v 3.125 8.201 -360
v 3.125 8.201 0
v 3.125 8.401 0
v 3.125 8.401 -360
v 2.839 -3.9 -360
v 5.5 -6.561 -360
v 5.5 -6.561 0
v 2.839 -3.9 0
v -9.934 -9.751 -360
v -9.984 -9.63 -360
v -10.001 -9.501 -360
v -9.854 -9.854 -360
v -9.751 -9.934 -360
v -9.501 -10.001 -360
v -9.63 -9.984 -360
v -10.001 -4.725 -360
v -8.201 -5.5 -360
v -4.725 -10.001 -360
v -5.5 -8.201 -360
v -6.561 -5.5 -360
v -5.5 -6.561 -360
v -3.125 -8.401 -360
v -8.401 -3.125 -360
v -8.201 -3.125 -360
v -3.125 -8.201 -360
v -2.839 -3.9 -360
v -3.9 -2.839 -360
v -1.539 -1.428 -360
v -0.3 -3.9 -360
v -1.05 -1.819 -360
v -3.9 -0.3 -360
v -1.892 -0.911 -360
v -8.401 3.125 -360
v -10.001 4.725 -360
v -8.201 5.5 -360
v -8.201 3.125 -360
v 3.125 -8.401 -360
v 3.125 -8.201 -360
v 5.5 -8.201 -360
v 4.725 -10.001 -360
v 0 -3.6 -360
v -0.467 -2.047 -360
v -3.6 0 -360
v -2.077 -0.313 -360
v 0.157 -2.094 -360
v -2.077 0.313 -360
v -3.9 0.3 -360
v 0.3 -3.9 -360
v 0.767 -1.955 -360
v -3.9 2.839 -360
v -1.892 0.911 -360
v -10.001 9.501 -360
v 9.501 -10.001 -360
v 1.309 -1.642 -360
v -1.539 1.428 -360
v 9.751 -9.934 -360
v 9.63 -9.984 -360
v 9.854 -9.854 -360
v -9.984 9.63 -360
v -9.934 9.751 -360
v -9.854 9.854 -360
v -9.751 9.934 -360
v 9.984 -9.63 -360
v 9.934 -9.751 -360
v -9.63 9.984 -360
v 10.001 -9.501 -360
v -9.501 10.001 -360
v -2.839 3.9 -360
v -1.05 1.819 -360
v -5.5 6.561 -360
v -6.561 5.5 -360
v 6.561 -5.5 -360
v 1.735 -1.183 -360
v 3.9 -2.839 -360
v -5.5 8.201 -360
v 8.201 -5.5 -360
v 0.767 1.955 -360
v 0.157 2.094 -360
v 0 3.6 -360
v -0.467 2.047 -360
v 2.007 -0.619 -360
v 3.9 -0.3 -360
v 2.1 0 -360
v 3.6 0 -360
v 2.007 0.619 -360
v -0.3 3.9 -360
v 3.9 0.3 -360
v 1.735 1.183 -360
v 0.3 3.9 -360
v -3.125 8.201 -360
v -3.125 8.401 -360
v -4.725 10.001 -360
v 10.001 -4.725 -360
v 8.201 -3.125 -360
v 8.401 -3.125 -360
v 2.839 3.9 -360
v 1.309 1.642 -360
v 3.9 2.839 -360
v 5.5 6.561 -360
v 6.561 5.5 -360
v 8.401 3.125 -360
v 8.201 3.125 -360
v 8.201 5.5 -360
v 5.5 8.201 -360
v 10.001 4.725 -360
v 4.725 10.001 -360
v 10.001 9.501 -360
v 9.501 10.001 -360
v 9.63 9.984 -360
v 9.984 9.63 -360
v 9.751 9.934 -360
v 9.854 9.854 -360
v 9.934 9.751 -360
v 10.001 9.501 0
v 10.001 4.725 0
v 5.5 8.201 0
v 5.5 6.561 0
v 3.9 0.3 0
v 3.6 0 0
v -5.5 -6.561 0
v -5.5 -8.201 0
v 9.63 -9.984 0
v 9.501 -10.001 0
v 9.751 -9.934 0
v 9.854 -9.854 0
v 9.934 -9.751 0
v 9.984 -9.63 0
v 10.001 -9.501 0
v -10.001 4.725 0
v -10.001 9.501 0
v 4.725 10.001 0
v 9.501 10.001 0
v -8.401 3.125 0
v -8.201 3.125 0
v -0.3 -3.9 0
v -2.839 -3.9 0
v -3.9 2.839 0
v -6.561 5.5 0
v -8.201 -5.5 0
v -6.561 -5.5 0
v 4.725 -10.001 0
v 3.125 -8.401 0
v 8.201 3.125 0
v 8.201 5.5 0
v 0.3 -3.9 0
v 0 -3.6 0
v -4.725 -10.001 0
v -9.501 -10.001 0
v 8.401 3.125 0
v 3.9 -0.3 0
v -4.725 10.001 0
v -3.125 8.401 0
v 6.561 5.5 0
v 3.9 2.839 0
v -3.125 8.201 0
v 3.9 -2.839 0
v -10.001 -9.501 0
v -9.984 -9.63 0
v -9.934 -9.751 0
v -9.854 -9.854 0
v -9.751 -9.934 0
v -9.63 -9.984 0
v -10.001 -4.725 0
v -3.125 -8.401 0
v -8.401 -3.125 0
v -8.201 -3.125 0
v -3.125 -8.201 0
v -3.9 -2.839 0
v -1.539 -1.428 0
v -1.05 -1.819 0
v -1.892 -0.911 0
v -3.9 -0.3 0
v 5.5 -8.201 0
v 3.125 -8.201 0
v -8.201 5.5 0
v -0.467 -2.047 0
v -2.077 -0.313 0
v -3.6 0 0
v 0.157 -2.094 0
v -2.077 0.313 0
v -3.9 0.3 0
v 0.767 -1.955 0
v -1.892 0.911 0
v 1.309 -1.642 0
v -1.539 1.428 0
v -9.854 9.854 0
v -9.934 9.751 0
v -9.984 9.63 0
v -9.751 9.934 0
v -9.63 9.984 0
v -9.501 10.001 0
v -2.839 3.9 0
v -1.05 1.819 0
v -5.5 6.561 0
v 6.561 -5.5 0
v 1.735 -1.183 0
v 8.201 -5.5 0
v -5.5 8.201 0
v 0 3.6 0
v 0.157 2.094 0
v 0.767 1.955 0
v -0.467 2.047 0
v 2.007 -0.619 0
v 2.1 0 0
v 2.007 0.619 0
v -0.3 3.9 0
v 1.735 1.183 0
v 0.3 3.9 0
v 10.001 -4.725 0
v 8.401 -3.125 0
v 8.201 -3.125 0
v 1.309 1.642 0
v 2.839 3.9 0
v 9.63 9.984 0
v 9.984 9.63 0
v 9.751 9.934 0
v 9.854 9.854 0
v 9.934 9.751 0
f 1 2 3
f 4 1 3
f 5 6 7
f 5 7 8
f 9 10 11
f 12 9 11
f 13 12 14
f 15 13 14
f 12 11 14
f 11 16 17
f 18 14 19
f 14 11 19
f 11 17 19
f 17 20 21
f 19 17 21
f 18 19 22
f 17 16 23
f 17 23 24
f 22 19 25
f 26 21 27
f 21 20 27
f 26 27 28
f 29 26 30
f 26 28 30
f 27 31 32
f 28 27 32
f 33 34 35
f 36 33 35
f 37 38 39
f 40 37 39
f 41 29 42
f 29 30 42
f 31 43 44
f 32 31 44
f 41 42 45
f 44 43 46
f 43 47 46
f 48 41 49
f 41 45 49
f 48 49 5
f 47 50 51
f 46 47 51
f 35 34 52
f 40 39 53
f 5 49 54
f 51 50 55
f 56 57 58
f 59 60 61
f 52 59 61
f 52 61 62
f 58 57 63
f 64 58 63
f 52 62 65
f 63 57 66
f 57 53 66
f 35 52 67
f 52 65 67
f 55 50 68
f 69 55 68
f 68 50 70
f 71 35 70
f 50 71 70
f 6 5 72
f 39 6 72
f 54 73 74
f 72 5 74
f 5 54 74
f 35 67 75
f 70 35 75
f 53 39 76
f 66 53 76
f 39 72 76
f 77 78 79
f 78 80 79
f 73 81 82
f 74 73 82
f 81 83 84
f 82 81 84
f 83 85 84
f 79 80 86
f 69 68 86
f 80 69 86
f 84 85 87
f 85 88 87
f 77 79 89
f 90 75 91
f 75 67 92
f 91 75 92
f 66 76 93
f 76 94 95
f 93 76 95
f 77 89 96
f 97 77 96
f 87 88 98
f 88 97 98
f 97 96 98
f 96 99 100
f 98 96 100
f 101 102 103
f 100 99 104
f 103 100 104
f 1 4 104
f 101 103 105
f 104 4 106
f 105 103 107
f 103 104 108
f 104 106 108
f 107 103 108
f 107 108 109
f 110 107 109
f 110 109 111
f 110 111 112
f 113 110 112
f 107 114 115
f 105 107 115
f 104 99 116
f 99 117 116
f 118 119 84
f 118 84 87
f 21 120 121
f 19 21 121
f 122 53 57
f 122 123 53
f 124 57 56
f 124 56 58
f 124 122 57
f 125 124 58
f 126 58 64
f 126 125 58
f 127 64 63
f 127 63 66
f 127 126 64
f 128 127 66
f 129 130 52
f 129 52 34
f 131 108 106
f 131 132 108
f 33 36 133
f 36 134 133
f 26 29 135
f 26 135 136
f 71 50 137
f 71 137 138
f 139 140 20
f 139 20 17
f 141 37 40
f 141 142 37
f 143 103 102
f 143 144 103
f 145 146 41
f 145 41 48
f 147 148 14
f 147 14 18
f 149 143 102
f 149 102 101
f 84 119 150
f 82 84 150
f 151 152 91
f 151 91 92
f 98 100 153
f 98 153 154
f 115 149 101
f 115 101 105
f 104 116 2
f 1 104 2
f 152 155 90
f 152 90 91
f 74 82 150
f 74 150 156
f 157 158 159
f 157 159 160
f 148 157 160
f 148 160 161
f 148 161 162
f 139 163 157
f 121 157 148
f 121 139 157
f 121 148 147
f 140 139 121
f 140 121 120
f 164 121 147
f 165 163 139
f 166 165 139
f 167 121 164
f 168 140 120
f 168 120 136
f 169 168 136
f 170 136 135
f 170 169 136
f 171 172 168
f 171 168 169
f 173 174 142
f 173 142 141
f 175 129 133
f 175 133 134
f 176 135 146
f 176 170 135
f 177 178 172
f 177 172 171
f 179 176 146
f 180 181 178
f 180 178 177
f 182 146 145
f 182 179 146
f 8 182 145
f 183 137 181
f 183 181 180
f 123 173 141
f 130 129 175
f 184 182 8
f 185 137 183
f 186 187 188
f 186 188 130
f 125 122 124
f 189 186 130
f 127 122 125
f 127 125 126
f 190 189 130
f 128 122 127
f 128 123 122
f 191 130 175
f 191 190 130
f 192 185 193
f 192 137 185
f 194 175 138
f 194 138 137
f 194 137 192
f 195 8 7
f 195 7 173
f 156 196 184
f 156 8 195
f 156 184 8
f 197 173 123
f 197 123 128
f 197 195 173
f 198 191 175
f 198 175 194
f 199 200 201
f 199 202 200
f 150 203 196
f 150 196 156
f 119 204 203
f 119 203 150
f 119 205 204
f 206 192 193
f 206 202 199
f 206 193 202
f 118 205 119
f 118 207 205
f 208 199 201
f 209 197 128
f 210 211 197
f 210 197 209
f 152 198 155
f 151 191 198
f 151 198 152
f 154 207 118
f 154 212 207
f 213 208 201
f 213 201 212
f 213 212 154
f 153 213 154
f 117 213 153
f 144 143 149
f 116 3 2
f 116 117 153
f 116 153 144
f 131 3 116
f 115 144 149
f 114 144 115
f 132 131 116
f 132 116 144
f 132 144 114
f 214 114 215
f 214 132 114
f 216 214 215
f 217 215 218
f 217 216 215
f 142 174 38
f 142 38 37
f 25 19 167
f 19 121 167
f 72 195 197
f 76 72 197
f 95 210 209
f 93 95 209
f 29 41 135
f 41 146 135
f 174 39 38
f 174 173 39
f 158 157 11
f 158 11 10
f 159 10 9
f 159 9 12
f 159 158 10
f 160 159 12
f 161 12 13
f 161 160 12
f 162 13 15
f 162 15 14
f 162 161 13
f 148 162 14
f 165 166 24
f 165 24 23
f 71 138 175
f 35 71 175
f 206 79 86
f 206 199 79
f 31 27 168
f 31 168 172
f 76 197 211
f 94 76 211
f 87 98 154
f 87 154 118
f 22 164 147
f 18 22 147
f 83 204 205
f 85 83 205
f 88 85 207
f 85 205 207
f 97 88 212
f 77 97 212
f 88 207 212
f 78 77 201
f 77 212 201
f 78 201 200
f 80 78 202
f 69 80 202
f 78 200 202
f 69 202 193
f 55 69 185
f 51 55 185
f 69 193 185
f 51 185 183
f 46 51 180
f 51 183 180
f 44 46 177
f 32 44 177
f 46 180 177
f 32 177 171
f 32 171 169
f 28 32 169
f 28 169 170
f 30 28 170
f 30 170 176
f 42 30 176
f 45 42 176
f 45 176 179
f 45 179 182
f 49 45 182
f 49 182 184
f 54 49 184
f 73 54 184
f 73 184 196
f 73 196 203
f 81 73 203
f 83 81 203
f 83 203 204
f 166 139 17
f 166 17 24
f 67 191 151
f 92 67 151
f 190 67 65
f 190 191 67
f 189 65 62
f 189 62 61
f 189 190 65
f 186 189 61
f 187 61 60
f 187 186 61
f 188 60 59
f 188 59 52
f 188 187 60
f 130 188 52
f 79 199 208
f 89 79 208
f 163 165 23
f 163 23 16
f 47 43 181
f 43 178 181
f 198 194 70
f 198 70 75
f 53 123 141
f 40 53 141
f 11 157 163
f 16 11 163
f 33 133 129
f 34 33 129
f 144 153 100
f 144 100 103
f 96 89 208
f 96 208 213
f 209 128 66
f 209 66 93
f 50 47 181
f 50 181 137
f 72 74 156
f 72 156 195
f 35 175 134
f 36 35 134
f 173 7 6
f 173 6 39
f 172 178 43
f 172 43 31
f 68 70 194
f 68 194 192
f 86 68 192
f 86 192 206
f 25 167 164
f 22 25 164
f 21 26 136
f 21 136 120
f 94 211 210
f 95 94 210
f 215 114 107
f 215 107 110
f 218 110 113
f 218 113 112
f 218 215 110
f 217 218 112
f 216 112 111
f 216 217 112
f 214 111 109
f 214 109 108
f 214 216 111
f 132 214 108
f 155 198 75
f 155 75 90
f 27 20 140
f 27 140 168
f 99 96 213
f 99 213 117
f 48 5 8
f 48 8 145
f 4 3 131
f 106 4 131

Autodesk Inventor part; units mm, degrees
ref_plane "YZ Plane" through (0, 0, 0) normal (1, 0, 0) x (0, 1, 0)
ref_plane "XZ Plane" through (0, 0, 0) normal (0, 1, 0) x (-1, 0, 0)
ref_plane "XY Plane" through (0, 0, 0) normal (0, 0, 1) x (1, 0, 0)
sketch "Sketch2" plane through (0, 0, 0) normal (0, 0, 1) x (1, 0, 0)
  arc A0 (-27.4375, 16.3608) -> (-26.9375, 16.8608) centre (-27.4375, 16.8608) ccw
  line L0 (-45.4375, 36.3608) -> (-46.4375, 36.3608)
  line L1 (-46.9375, 34.8608) -> (-46.9375, 35.8608)
  line L2 (-28.4375, 36.3608) -> (-27.4375, 36.3608)
  line L3 (-26.9375, 17.8608) -> (-26.9375, 16.8608)
  line L4 (-28.4375, 16.3608) -> (-27.4375, 16.3608)
  line L5 (-26.9375, 31.1923) -> (-26.9375, 35.8608)
  line L6 (-46.4375, 16.3608) -> (-41.7689, 16.3608)
  line L7 (-46.9375, 17.8608) -> (-46.9375, 16.8608)
  arc A1 (-46.9375, 16.8608) -> (-46.4375, 16.3608) centre (-46.4375, 16.8608) ccw
  arc A2 (-46.9375, 16.8608) -> (-46.4375, 16.3608) centre (-46.4375, 16.8608) ccw
  arc A3 (-46.4375, 36.3608) -> (-46.9375, 35.8608) centre (-46.4375, 35.8608) ccw
  arc A4 (-26.9375, 35.8608) -> (-27.4375, 36.3608) centre (-27.4375, 35.8608) ccw
  line L8 (-41.5004, 36.2982) -> (-41.5366, 36.3146)
  line L9 (-46.812, 30.8227) -> (-46.8352, 30.855)
  line L10 (-46.9375, 17.8608) -> (-46.9375, 21.4608)
  line L11 (-46.9362, 21.5691) -> (-46.9375, 21.4608)
  line L12 (-46.9258, 21.6478) -> (-46.9323, 21.6086)
  line L13 (-46.9323, 21.6086) -> (-46.9362, 21.5691)
  line L14 (-46.9168, 21.6865) -> (-46.9258, 21.6478)
  line L15 (-46.9053, 21.7245) -> (-46.9168, 21.6865)
  line L16 (-46.8913, 21.7617) -> (-46.9053, 21.7245)
  line L17 (-46.8749, 21.7979) -> (-46.8913, 21.7617)
  line L18 (-46.8561, 21.8329) -> (-46.8749, 21.7979)
  line L19 (-46.812, 21.8989) -> (-46.8352, 21.8667)
  line L20 (-46.8352, 21.8667) -> (-46.8561, 21.8329)
  line L21 (-41.4654, 36.2795) -> (-41.5004, 36.2982)
  line L22 (-46.7868, 21.9297) -> (-46.812, 21.8989)
  line L23 (-46.7597, 21.9586) -> (-46.7868, 21.9297)
  line L24 (-46.7597, 21.9586) -> (-45.2441, 23.4742)
  line L25 (-45.2441, 23.4742) -> (-45.1375, 23.4742)
  line L26 (-45.1375, 23.4742) -> (-45.1375, 20.8608)
  line L27 (-45.1375, 20.8608) -> (-43.4981, 20.8608)
  line L28 (-43.4981, 20.8608) -> (-40.8375, 23.5215)
  line L29 (-46.7868, 30.792) -> (-46.812, 30.8227)
  line L30 (-40.8375, 26.161) -> (-40.8375, 23.5215)
  line L31 (-40.6376, 26.3608) -> (-40.8375, 26.161)
  line L32 (-40.6376, 26.3608) -> (-40.8375, 26.5607)
  line L33 (-40.8375, 29.2002) -> (-40.8375, 26.5607)
  line L34 (-43.4981, 31.8608) -> (-40.8375, 29.2002)
  line L35 (-45.1375, 31.8608) -> (-43.4981, 31.8608)
  line L36 (-45.1375, 29.2475) -> (-45.1375, 31.8608)
  line L37 (-46.7597, 30.763) -> (-46.7868, 30.792)
  line L38 (-45.2441, 29.2475) -> (-45.1375, 29.2475)
  line L39 (-45.2441, 29.2475) -> (-46.7597, 30.763)
  line L40 (-28.7375, 20.8608) -> (-30.3768, 20.8608)
  line L41 (-41.5738, 36.3286) -> (-41.6118, 36.3402)
  line L42 (-41.3687, 36.2102) -> (-41.3994, 36.2354)
  line L43 (-41.3397, 36.183) -> (-41.3687, 36.2102)
  line L44 (-41.6118, 36.3402) -> (-41.6505, 36.3492)
  line L45 (-41.7292, 16.3621) -> (-41.7689, 16.3608)
  line L46 (-41.6897, 16.366) -> (-41.7292, 16.3621)
  line L47 (-41.6505, 16.3725) -> (-41.6897, 16.366)
  line L48 (-41.6118, 16.3815) -> (-41.6505, 16.3725)
  line L49 (-41.5738, 16.3931) -> (-41.6118, 16.3815)
  line L50 (-41.5366, 16.4071) -> (-41.5738, 16.3931)
  line L51 (-42.4375, 32.9215) -> (-39.7768, 30.2608)
  line L52 (-41.5004, 16.4235) -> (-41.5366, 16.4071)
  line L53 (-41.4654, 16.4422) -> (-41.5004, 16.4235)
  line L54 (-41.4317, 16.4632) -> (-41.4654, 16.4422)
  line L55 (-41.3994, 16.4863) -> (-41.4317, 16.4632)
  line L56 (-41.3687, 16.5115) -> (-41.3994, 16.4863)
  line L57 (-41.3397, 16.5386) -> (-41.3687, 16.5115)
  line L58 (-41.3397, 16.5386) -> (-39.8241, 18.0542)
  line L59 (-39.8241, 18.0542) -> (-39.8241, 18.1608)
  line L60 (-39.8241, 18.1608) -> (-42.4375, 18.1608)
  line L61 (-42.4375, 18.1608) -> (-42.4375, 19.8002)
  line L62 (-42.4375, 19.8002) -> (-39.7768, 22.4608)
  line L63 (-39.7768, 22.4608) -> (-37.1444, 22.4608)
  line L64 (-37.1444, 22.4608) -> (-36.9375, 22.6656)
  line L65 (-36.9375, 22.6656) -> (-36.7327, 22.4608)
  line L66 (-36.7327, 22.4608) -> (-34.0981, 22.4608)
  line L67 (-34.0981, 22.4608) -> (-31.4375, 19.8002)
  line L68 (-31.4375, 18.1608) -> (-31.4375, 19.8002)
  line L69 (-41.3397, 36.183) -> (-39.8241, 34.6675)
  line L70 (-34.0508, 18.1608) -> (-31.4375, 18.1608)
  line L71 (-41.6505, 36.3492) -> (-41.6897, 36.3557)
  line L72 (-34.0508, 18.0542) -> (-34.0508, 18.1608)
  line L73 (-34.0508, 18.0542) -> (-32.5353, 16.5387)
  line L74 (-32.5353, 16.5387) -> (-32.5063, 16.5115)
  line L75 (-32.5063, 16.5115) -> (-32.4756, 16.4863)
  line L76 (-32.4756, 16.4863) -> (-32.4433, 16.4632)
  line L77 (-32.4433, 16.4632) -> (-32.4096, 16.4422)
  line L78 (-32.4096, 16.4422) -> (-32.3745, 16.4235)
  line L79 (-32.3745, 16.4235) -> (-32.3383, 16.4071)
  line L80 (-32.3383, 16.4071) -> (-32.3012, 16.3931)
  line L81 (-32.3012, 16.3931) -> (-32.2631, 16.3815)
  line L82 (-32.2631, 16.3815) -> (-32.2245, 16.3725)
  line L83 (-32.2245, 16.3725) -> (-32.1853, 16.366)
  line L84 (-32.1853, 16.366) -> (-32.1457, 16.3621)
  line L85 (-32.1457, 16.3621) -> (-32.106, 16.3608)
  line L86 (-28.4375, 16.3608) -> (-32.106, 16.3608)
  line L87 (-39.8241, 34.6675) -> (-39.8241, 34.5608)
  line L88 (-41.6897, 36.3557) -> (-41.7292, 36.3595)
  line L89 (-26.9375, 17.8608) -> (-26.9375, 21.5294)
  line L90 (-26.9388, 21.5691) -> (-26.9375, 21.5294)
  line L91 (-26.9427, 21.6086) -> (-26.9388, 21.5691)
  line L92 (-26.9491, 21.6478) -> (-26.9427, 21.6086)
  line L93 (-26.9582, 21.6865) -> (-26.9491, 21.6478)
  line L94 (-26.9697, 21.7245) -> (-26.9582, 21.6865)
  line L95 (-26.9837, 21.7617) -> (-26.9697, 21.7245)
  line L96 (-27.0001, 21.7979) -> (-26.9837, 21.7617)
  line L97 (-41.7292, 36.3595) -> (-41.7689, 36.3608)
  line L98 (-27.0188, 21.8329) -> (-27.0001, 21.7979)
  line L99 (-27.0398, 21.8667) -> (-27.0188, 21.8329)
  line L100 (-27.0629, 21.8989) -> (-27.0398, 21.8667)
  line L101 (-27.0881, 21.9297) -> (-27.0629, 21.8989)
  line L102 (-27.1153, 21.9587) -> (-27.0881, 21.9297)
  line L103 (-28.6308, 23.4742) -> (-27.1153, 21.9587)
  line L104 (-28.6308, 23.4742) -> (-28.7375, 23.4742)
  line L105 (-28.7375, 23.4742) -> (-28.7375, 20.8608)
  line L106 (-32.3012, 36.3286) -> (-32.2631, 36.3402)
  line L107 (-30.3768, 20.8608) -> (-33.0375, 23.5215)
  line L108 (-33.0375, 23.5215) -> (-33.0375, 26.161)
  line L109 (-33.2373, 26.3608) -> (-33.0375, 26.161)
  line L110 (-33.2373, 26.3608) -> (-33.0375, 26.5607)
  line L111 (-33.0375, 29.2002) -> (-33.0375, 26.5607)
  line L112 (-30.3768, 31.8608) -> (-33.0375, 29.2002)
  line L113 (-45.4375, 36.3608) -> (-41.7689, 36.3608)
  line L114 (-28.6308, 29.2475) -> (-28.7375, 29.2475)
  line L115 (-28.7375, 31.8608) -> (-30.3768, 31.8608)
  line L116 (-28.7375, 29.2475) -> (-28.7375, 31.8608)
  line L117 (-27.1153, 30.763) -> (-28.6308, 29.2475)
  line L118 (-27.1153, 30.763) -> (-27.0881, 30.792)
  line L119 (-27.0881, 30.792) -> (-27.0629, 30.8227)
  line L120 (-27.0629, 30.8227) -> (-27.0398, 30.855)
  line L121 (-27.0398, 30.855) -> (-27.0188, 30.8888)
  line L122 (-27.0188, 30.8888) -> (-27.0001, 30.9238)
  line L123 (-27.0001, 30.9238) -> (-26.9837, 30.96)
  line L124 (-26.9837, 30.96) -> (-26.9697, 30.9972)
  line L125 (-26.9697, 30.9972) -> (-26.9582, 31.0352)
  line L126 (-26.9582, 31.0352) -> (-26.9491, 31.0739)
  line L127 (-26.9491, 31.0739) -> (-26.9427, 31.1131)
  line L128 (-26.9427, 31.1131) -> (-26.9388, 31.1526)
  line L129 (-26.9388, 31.1526) -> (-26.9375, 31.1923)
  line L130 (-39.8241, 34.5608) -> (-42.4375, 34.5608)
  line L131 (-28.4375, 36.3608) -> (-32.106, 36.3608)
  line L132 (-32.1457, 36.3595) -> (-32.106, 36.3608)
  line L133 (-32.1853, 36.3557) -> (-32.1457, 36.3595)
  line L134 (-32.2631, 36.3402) -> (-32.2245, 36.3492)
  line L135 (-32.3383, 36.3146) -> (-32.3012, 36.3286)
  line L136 (-32.3745, 36.2982) -> (-32.3383, 36.3146)
  line L137 (-32.4096, 36.2795) -> (-32.3745, 36.2982)
  line L138 (-32.4433, 36.2585) -> (-32.4096, 36.2795)
  line L139 (-32.4756, 36.2354) -> (-32.4433, 36.2585)
  line L140 (-32.5063, 36.2102) -> (-32.4756, 36.2354)
  line L141 (-46.9323, 31.1131) -> (-46.9362, 31.1526)
  line L142 (-34.0508, 34.6675) -> (-32.5353, 36.183)
  line L143 (-34.0508, 34.6675) -> (-34.0508, 34.5608)
  line L144 (-34.0508, 34.5608) -> (-31.4375, 34.5608)
  line L145 (-31.4375, 34.5608) -> (-31.4375, 32.9215)
  line L146 (-34.0981, 30.2608) -> (-31.4375, 32.9215)
  line L147 (-34.0981, 30.2608) -> (-36.7327, 30.2608)
  line L148 (-42.4375, 34.5608) -> (-42.4375, 32.9215)
  line L149 (-36.7327, 30.2608) -> (-36.9375, 30.0561)
  line L150 (-37.1422, 30.2608) -> (-36.9375, 30.0561)
  line L151 (-39.7768, 30.2608) -> (-37.1422, 30.2608)
  line L152 (-32.5353, 36.183) -> (-32.5063, 36.2102)
  line L153 (-41.3994, 36.2354) -> (-41.4317, 36.2585)
  line L154 (-46.9258, 31.0739) -> (-46.9323, 31.1131)
  line L155 (-41.4317, 36.2585) -> (-41.4654, 36.2795)
  line L156 (-46.9362, 31.1526) -> (-46.9375, 31.2608)
  line L157 (-46.9168, 31.0352) -> (-46.9258, 31.0739)
  line L158 (-46.9375, 34.8608) -> (-46.9375, 31.2608)
  line L159 (-46.9053, 30.9972) -> (-46.9168, 31.0352)
  line L160 (-46.8913, 30.96) -> (-46.9053, 30.9972)
  line L161 (-46.8749, 30.9238) -> (-46.8913, 30.96)
  line L162 (-46.8561, 30.8888) -> (-46.8749, 30.9238)
  line L163 (-32.2245, 36.3492) -> (-32.1853, 36.3557)
  line L164 (-41.5366, 36.3146) -> (-41.5738, 36.3286)
  line L165 (-46.8352, 30.855) -> (-46.8561, 30.8888)
  circle A5 centre (-36.9375, 26.3608) radius 2.1
  line L166 (3.9, -0.3) -> (3.9, -2.8393)
  line L167 (2.8393, -3.9) -> (0.3, -3.9)
  line L168 (5.5, -6.5607) -> (2.8393, -3.9)
  line L169 (3.9, -2.8393) -> (6.5607, -5.5)
  line L170 (6.5607, -5.5) -> (8.2007, -5.5)
  line L171 (8.2007, -5.5) -> (8.2007, -3.125)
  line L172 (8.2007, -3.125) -> (8.4007, -3.125)
  line L173 (8.4007, -3.125) -> (10.0007, -4.725)
  line L174 (10.0007, -9.5007) -> (10.0007, -4.725)
  line L175 (5.5, -6.5607) -> (5.5, -8.2007)
  line L176 (5.5, -8.2007) -> (3.125, -8.2007)
  line L177 (3.125, -8.2007) -> (3.125, -8.4007)
  line L178 (3.125, -8.4007) -> (4.725, -10.0007)
  line L179 (9.5007, -10.0007) -> (4.725, -10.0007)
  arc A6 (9.5007, -10.0007) -> (10.0007, -9.5007) centre (9.5007, -9.5007) ccw
  line L180 (0, -3.6) -> (0.3, -3.9)
  line L181 (3.6, 0) -> (3.9, -0.3)
  line L182 (3.125, 8.2007) -> (3.125, 8.4007)
  line L183 (0.3, 3.9) -> (2.8393, 3.9)
  line L184 (5.5, 8.2007) -> (3.125, 8.2007)
  line L185 (2.8393, 3.9) -> (5.5, 6.5607)
  line L186 (3.9, 2.8393) -> (3.9, 0.3)
  line L187 (3.6, 0) -> (3.9, 0.3)
  line L188 (6.5607, 5.5) -> (3.9, 2.8393)
  line L189 (5.5, 6.5607) -> (5.5, 8.2007)
  line L190 (3.125, 8.4007) -> (4.725, 10.0007)
  line L191 (6.5607, 5.5) -> (8.2007, 5.5)
  line L192 (8.2007, 5.5) -> (8.2007, 3.125)
  line L193 (8.2007, 3.125) -> (8.4007, 3.125)
  line L194 (8.4007, 3.125) -> (10.0007, 4.725)
  line L195 (9.5007, 10.0007) -> (4.725, 10.0007)
  arc A7 (10.0007, 9.5007) -> (9.5007, 10.0007) centre (9.5007, 9.5007) ccw
  line L196 (10.0007, 9.5007) -> (10.0007, 4.725)
  line L197 (0, 3.6) -> (0.3, 3.9)
  line L198 (-8.2007, 3.125) -> (-8.4007, 3.125)
  line L199 (-3.9, 0.3) -> (-3.9, 2.8393)
  line L200 (-8.2007, 5.5) -> (-8.2007, 3.125)
  line L201 (-3.9, 2.8393) -> (-6.5607, 5.5)
  line L202 (-2.8393, 3.9) -> (-0.3, 3.9)
  line L203 (0, 3.6) -> (-0.3, 3.9)
  line L204 (-5.5, 6.5607) -> (-2.8393, 3.9)
  line L205 (-6.5607, 5.5) -> (-8.2007, 5.5)
  line L206 (-8.4007, 3.125) -> (-10.0007, 4.725)
  line L207 (-5.5, 6.5607) -> (-5.5, 8.2007)
  line L208 (-5.5, 8.2007) -> (-3.125, 8.2007)
  line L209 (-3.125, 8.2007) -> (-3.125, 8.4007)
  line L210 (-3.125, 8.4007) -> (-4.725, 10.0007)
  line L211 (-10.0007, 9.5007) -> (-10.0007, 4.725)
  arc A8 (-9.5007, 10.0007) -> (-10.0007, 9.5007) centre (-9.5007, 9.5007) ccw
  line L212 (-9.5007, 10.0007) -> (-4.725, 10.0007)
  line L213 (-3.6, 0) -> (-3.9, 0.3)
  line L214 (-3.125, -8.2007) -> (-3.125, -8.4007)
  line L215 (-0.3, -3.9) -> (-2.8393, -3.9)
  line L216 (-5.5, -8.2007) -> (-3.125, -8.2007)
  line L217 (-2.8393, -3.9) -> (-5.5, -6.5607)
  line L218 (-3.9, -2.8393) -> (-3.9, -0.3)
  line L219 (-3.6, 0) -> (-3.9, -0.3)
  line L220 (-6.5607, -5.5) -> (-3.9, -2.8393)
  line L221 (-5.5, -6.5607) -> (-5.5, -8.2007)
  line L222 (-3.125, -8.4007) -> (-4.725, -10.0007)
  line L223 (-6.5607, -5.5) -> (-8.2007, -5.5)
  line L224 (-8.2007, -5.5) -> (-8.2007, -3.125)
  line L225 (-8.2007, -3.125) -> (-8.4007, -3.125)
  line L226 (-8.4007, -3.125) -> (-10.0007, -4.725)
  line L227 (-9.5007, -10.0007) -> (-4.725, -10.0007)
  arc A9 (-10.0007, -9.5007) -> (-9.5007, -10.0007) centre (-9.5007, -9.5007) ccw
  line L228 (-10.0007, -9.5007) -> (-10.0007, -4.725)
  line L229 (0, -3.6) -> (-0.3, -3.9)
  circle A10 centre (0, 0) radius 2.1
  point P0 (0, -3.9)
  point P1 (3.9, 0)
  point P2 (3.9, 0)
  point P3 (0, 3.9)
  point P4 (0, 3.9)
  point P5 (3.9, 0)
  point P6 (-3.9, 0)
  point P7 (-3.9, 0)
  point P8 (0, 3.9)
  point P9 (0, -3.9)
  point P10 (0, -3.9)
  point P11 (-3.9, 0)
  dimension "d1" = 4.2
  dimension "d2" = 1.5
  dimension "d4" = 3.9
  dimension "d5" = 3.9
  dimension "d7" = 1.5
  dimension "d9" = 1.64
  dimension "d10" = 135
  dimension "d11" = 1.8
  dimension "d12" = 3.125
  dimension "d13" = 5.5
  dimension "d14" = 45
  dimension "d15" = 0.2
  dimension "d16" = 0.5
  dimension "d17" = 0.3
  dimension "d18" = 0.3
  dimension "d19" = 0.3
  dimension "d20" = 0.3
  dimension "d23" = 360
  dimension "d25" = 4.2
extrude "Extrusion1" add sketch "Sketch2" against normal blind 360 contours L166 L169 L170 L171 L172 L173 L174 A6 L179 L178 L177 L176 L175 L168 L167 L180 L229 L215 L217 L221 L216 L214 L222 L227 A9 L228 L226 L225 L224 L223 L220 L218 L219 L213 L199 L201 L205 L200 L198 L206 L211 A8 L212 L210 L209 L208 L207 L204 L202 L203 L197 L183 L185 L189 L184 L182 L190 L195 A7 L196 L194 L193 L192 L191 L188 L186 L187 L181
equation "\"d5\" = d4"
equation "\"d18\" = d17"
equation "\"d20\" = d19"
properties part number "v-slot" material "Aluminum 6061"
